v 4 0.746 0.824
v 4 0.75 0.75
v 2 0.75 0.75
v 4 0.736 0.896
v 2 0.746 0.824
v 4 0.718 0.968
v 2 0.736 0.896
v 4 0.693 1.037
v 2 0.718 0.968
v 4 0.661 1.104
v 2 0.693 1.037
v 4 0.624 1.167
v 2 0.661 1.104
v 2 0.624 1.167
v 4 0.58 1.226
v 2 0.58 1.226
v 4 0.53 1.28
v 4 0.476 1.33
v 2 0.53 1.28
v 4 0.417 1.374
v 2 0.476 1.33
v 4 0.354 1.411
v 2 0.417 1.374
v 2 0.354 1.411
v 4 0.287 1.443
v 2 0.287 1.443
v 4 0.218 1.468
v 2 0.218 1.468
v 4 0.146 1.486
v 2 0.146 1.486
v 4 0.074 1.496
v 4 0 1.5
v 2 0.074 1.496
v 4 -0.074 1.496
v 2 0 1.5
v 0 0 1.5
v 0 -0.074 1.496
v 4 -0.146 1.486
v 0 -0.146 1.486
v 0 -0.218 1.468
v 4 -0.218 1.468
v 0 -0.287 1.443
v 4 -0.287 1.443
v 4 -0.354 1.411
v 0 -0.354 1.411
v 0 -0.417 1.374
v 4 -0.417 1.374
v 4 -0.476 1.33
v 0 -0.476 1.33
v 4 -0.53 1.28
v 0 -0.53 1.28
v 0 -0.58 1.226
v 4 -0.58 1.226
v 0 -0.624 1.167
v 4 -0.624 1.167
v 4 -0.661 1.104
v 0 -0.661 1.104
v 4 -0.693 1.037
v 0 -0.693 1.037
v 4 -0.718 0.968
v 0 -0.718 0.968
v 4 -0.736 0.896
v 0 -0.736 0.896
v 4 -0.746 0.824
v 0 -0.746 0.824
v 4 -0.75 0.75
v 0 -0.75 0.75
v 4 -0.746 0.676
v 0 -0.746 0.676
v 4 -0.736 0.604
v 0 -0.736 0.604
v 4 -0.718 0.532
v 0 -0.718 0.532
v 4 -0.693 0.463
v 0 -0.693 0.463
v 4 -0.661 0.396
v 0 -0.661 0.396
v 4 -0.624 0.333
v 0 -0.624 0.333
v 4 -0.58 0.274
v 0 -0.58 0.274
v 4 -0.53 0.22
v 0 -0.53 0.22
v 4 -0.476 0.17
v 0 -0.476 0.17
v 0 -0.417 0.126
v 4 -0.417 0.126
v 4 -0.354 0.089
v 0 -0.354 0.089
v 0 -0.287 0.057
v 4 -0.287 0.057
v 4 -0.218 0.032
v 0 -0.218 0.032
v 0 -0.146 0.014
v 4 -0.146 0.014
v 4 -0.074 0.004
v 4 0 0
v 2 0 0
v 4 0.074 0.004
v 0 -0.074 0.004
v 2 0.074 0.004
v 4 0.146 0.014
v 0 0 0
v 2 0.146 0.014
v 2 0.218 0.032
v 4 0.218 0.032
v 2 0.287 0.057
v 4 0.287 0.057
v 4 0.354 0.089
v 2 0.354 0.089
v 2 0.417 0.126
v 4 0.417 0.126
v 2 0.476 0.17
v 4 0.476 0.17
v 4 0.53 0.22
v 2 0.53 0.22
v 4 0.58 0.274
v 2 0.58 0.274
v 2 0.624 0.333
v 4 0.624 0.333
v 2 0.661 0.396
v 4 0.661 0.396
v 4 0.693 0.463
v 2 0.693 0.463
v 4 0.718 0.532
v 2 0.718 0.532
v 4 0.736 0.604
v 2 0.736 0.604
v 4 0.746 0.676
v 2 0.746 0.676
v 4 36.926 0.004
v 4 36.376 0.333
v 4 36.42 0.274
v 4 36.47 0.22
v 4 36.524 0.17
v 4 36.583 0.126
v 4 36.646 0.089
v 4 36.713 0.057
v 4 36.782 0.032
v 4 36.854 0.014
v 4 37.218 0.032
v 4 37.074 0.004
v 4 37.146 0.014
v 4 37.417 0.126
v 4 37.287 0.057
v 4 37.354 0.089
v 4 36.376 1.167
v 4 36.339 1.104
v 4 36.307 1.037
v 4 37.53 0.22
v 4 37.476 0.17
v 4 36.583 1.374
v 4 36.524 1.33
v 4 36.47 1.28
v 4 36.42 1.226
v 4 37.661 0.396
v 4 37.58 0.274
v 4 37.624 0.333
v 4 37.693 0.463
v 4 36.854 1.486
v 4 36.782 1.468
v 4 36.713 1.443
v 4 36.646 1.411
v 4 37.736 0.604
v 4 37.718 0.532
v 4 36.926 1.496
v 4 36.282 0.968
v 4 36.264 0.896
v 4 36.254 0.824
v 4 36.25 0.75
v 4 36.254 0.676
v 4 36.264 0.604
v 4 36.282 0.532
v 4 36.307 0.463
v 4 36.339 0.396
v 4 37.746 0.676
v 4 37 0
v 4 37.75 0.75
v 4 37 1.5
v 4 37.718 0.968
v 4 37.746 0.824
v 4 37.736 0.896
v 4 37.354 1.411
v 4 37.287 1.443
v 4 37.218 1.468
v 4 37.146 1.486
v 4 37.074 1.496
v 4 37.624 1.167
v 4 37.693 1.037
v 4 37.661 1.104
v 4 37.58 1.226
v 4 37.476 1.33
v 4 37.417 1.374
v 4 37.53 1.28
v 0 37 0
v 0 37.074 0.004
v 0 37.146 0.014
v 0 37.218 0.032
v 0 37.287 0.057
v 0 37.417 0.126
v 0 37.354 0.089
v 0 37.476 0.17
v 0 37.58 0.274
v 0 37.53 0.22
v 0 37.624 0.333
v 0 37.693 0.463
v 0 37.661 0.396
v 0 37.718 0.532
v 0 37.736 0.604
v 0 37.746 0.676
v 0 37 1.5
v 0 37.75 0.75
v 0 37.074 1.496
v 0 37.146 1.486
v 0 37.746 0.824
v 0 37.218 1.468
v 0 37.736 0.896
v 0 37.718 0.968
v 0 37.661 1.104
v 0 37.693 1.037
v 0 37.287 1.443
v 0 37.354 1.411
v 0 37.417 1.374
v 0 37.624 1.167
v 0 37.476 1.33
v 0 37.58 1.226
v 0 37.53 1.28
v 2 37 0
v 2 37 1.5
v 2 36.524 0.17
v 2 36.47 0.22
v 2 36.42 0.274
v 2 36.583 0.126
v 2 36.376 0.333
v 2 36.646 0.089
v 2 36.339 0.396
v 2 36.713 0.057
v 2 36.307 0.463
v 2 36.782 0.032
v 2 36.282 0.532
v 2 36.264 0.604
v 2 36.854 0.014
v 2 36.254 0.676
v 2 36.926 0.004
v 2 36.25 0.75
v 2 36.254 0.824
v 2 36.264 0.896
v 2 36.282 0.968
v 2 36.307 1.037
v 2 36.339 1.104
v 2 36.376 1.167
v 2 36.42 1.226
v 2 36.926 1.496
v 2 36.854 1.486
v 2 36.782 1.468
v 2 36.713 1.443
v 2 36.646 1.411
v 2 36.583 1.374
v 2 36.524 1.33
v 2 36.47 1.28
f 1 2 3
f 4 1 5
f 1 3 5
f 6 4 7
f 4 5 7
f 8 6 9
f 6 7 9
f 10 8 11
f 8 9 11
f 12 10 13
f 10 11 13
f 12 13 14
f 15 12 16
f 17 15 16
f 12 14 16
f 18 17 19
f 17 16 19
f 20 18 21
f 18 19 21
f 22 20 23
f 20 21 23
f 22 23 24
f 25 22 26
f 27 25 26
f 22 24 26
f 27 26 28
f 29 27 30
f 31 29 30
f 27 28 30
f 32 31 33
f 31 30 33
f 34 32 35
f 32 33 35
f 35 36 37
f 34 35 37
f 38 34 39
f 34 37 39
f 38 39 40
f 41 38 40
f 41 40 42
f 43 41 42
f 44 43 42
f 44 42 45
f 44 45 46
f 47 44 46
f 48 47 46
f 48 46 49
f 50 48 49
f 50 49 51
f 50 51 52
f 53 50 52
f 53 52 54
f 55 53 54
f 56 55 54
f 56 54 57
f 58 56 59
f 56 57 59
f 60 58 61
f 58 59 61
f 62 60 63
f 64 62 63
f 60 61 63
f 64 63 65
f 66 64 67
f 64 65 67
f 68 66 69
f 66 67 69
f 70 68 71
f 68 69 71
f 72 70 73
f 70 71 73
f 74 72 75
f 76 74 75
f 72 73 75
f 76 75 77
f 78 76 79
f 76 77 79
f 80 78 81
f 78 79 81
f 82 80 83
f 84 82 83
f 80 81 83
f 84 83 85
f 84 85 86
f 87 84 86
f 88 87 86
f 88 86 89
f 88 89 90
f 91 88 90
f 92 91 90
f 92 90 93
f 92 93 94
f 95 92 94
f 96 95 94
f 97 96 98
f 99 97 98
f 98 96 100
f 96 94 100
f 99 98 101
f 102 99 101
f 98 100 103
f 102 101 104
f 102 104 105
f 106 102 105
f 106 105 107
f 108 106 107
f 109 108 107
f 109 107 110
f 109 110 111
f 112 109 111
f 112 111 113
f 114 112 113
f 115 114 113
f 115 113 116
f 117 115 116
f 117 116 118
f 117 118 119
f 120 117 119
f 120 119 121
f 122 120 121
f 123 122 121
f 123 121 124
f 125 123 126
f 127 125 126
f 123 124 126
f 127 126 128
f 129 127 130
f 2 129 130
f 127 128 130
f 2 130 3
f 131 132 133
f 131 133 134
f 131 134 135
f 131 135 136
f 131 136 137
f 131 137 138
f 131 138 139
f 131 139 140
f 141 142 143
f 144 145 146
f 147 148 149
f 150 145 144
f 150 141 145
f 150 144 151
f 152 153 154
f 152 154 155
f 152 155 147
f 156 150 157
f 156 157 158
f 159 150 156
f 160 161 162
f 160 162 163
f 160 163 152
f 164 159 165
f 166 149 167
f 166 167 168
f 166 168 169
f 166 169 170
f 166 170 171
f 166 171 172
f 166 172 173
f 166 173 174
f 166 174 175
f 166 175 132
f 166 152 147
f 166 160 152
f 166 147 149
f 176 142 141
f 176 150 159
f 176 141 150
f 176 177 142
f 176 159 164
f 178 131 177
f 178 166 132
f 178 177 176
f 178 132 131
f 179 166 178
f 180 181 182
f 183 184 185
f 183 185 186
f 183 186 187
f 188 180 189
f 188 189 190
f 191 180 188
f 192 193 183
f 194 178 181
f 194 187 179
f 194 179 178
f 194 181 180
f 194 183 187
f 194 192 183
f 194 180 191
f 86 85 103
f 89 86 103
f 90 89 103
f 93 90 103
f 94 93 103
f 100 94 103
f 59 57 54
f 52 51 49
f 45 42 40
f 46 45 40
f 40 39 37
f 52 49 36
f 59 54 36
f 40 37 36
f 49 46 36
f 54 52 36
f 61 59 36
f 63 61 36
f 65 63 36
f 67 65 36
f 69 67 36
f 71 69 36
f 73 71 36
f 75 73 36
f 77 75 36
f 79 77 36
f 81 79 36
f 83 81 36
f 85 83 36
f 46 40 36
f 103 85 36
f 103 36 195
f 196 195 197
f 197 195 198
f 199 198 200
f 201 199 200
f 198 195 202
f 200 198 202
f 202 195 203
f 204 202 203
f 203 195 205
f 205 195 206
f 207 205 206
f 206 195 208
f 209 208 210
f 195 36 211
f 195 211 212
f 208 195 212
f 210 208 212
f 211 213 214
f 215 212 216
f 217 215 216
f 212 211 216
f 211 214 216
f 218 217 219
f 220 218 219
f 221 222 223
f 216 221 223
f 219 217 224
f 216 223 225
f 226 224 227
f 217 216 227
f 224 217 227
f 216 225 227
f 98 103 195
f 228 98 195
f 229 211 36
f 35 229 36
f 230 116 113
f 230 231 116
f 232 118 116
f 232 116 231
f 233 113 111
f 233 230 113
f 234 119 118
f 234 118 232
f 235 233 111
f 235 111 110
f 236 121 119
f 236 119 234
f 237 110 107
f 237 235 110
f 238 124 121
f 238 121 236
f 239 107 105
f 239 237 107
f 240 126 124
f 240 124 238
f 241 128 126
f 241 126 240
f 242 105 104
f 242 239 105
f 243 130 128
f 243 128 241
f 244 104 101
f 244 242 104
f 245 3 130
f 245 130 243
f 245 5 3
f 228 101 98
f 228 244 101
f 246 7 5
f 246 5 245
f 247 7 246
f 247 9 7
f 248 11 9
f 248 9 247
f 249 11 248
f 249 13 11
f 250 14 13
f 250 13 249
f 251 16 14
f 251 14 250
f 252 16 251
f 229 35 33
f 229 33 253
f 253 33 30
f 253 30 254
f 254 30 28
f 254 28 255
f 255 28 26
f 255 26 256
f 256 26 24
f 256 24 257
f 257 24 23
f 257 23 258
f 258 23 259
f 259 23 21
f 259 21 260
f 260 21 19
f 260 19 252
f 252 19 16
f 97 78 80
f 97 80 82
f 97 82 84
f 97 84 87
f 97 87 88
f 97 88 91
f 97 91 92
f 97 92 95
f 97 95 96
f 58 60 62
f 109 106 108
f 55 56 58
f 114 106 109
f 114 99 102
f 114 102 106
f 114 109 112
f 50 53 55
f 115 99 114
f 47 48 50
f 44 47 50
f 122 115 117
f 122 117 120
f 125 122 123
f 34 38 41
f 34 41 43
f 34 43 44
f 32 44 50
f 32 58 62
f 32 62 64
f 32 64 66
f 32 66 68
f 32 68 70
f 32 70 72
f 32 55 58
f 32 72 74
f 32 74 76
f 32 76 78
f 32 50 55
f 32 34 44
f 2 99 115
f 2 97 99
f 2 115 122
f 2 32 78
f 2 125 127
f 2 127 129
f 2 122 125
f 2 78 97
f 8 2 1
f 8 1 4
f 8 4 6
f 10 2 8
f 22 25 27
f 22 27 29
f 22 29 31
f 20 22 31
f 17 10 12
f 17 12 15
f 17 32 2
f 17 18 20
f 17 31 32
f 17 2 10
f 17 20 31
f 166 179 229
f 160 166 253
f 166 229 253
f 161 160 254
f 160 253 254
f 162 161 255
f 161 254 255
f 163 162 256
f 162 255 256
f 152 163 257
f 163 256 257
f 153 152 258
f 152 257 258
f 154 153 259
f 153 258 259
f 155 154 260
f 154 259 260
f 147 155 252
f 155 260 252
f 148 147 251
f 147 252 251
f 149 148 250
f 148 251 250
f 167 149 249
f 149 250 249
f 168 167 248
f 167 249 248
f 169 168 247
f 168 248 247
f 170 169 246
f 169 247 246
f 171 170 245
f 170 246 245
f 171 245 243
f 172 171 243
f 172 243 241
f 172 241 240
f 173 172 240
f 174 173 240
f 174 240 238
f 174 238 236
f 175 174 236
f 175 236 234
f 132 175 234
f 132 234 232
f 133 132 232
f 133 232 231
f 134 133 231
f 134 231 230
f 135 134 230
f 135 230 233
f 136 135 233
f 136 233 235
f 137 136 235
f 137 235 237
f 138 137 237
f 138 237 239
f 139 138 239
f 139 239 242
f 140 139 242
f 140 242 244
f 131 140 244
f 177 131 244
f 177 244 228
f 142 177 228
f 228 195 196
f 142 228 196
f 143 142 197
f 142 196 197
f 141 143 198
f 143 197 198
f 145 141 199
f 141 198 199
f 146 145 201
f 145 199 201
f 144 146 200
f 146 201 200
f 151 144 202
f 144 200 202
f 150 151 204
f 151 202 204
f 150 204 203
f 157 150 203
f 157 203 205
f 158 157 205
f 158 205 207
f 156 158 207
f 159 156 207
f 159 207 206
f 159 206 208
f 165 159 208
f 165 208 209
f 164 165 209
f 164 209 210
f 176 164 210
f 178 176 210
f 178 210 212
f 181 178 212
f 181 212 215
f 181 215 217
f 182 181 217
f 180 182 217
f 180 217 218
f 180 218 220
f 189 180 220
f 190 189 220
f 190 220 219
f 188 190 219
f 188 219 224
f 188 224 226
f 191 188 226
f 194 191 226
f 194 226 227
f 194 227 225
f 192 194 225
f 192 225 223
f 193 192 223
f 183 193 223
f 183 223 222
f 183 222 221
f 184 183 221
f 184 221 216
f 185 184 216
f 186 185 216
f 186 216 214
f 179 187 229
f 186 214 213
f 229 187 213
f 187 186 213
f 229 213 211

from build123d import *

# Parameters (mm, degrees)
BOSS_EXTRUDE1_DEPTH = 2
SKETCH1_3_R         = 0.75
BOSS_EXTRUDE2_DEPTH = 4


with BuildPart() as part:
    # Sketch1 → Boss-Extrude1 (new body)
    with BuildSketch(Plane.YZ):
        with BuildLine():
            Line((37, 1.5), (0, 1.5))
            ThreePointArc((0, 1.5), (-0.75, 0.75), (0, 0))
            Line((0, 0), (37, 0))
            ThreePointArc((37, 0), (37.75, 0.75), (37, 1.5))
        make_face()
    extrude(amount=BOSS_EXTRUDE1_DEPTH)

    # Sketch1<3> → Boss-Extrude2 (add)
    with BuildSketch(Plane.YZ):
        with Locations((0, 0.75)):
            Circle(SKETCH1_3_R)
        with Locations((37, 0.75)):
            Circle(SKETCH1_3_R)
    extrude(amount=BOSS_EXTRUDE2_DEPTH)


solid = part.part
